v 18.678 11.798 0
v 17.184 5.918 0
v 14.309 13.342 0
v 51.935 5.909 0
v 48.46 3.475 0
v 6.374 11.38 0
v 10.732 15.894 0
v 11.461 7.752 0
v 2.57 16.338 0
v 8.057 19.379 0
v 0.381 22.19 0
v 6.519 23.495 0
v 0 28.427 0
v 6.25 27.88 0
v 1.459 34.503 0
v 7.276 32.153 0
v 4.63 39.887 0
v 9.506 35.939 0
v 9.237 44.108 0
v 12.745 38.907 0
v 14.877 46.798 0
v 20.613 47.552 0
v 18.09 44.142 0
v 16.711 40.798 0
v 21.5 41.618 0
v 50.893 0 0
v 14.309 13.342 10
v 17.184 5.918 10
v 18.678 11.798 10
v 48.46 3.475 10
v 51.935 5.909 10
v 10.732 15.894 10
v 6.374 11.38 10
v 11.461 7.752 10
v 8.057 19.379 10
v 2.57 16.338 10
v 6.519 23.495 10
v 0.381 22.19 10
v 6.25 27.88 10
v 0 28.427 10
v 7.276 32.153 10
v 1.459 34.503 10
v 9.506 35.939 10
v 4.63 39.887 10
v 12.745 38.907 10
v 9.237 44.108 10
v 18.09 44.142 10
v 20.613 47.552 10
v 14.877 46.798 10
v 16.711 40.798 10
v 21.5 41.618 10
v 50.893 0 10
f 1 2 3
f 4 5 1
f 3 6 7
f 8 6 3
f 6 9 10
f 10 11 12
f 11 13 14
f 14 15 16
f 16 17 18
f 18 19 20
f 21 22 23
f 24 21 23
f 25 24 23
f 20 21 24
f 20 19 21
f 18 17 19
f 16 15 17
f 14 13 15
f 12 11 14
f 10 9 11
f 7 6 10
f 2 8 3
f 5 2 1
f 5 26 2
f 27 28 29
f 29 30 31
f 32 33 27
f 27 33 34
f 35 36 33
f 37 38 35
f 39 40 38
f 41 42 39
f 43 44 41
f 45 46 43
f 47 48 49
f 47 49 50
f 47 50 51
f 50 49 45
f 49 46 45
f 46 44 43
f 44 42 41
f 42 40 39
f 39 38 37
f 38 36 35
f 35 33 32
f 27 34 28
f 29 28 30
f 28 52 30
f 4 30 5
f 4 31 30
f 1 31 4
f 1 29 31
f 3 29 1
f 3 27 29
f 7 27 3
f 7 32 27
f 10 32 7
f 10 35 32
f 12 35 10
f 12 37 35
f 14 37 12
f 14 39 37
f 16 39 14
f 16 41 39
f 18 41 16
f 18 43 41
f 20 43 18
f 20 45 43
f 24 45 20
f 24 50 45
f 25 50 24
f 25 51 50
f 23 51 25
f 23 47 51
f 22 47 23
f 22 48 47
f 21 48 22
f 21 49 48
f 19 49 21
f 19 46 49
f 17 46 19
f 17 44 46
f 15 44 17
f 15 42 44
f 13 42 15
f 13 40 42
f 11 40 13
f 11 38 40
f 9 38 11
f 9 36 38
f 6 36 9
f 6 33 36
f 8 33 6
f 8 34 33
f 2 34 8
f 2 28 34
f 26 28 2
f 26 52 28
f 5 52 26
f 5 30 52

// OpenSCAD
$fn = 32;

// ----------------------------------------------------------------------
// Hook plate: curl radius 18 mm over 170 degrees, 6 mm thick band
// ----------------------------------------------------------------------

// --- parameters (mm) ---
profile_height = 10;      // extrusion height
profile_points = 26;      // points of the closed outline

profile = [[18.09, 44.142], [20.613, 47.552], [14.877, 46.798], [9.237, 44.108], [4.63, 39.887], [1.459, 34.503], [0, 28.427], [0.381, 22.19], [2.57, 16.338], [6.374, 11.38], [11.461, 7.752], [17.184, 5.918], [50.893, 0], [48.46, 3.475], [51.935, 5.909], [18.678, 11.798], [14.309, 13.342], [10.732, 15.894], [8.057, 19.379], [6.519, 23.495], [6.25, 27.88], [7.276, 32.153], [9.506, 35.939], [12.745, 38.907], [16.711, 40.798], [21.5, 41.618]];  // single closed polygon, 26 points, counter clockwise

// --- the one profile operation ---
linear_extrude(height = profile_height) polygon(points = profile);
